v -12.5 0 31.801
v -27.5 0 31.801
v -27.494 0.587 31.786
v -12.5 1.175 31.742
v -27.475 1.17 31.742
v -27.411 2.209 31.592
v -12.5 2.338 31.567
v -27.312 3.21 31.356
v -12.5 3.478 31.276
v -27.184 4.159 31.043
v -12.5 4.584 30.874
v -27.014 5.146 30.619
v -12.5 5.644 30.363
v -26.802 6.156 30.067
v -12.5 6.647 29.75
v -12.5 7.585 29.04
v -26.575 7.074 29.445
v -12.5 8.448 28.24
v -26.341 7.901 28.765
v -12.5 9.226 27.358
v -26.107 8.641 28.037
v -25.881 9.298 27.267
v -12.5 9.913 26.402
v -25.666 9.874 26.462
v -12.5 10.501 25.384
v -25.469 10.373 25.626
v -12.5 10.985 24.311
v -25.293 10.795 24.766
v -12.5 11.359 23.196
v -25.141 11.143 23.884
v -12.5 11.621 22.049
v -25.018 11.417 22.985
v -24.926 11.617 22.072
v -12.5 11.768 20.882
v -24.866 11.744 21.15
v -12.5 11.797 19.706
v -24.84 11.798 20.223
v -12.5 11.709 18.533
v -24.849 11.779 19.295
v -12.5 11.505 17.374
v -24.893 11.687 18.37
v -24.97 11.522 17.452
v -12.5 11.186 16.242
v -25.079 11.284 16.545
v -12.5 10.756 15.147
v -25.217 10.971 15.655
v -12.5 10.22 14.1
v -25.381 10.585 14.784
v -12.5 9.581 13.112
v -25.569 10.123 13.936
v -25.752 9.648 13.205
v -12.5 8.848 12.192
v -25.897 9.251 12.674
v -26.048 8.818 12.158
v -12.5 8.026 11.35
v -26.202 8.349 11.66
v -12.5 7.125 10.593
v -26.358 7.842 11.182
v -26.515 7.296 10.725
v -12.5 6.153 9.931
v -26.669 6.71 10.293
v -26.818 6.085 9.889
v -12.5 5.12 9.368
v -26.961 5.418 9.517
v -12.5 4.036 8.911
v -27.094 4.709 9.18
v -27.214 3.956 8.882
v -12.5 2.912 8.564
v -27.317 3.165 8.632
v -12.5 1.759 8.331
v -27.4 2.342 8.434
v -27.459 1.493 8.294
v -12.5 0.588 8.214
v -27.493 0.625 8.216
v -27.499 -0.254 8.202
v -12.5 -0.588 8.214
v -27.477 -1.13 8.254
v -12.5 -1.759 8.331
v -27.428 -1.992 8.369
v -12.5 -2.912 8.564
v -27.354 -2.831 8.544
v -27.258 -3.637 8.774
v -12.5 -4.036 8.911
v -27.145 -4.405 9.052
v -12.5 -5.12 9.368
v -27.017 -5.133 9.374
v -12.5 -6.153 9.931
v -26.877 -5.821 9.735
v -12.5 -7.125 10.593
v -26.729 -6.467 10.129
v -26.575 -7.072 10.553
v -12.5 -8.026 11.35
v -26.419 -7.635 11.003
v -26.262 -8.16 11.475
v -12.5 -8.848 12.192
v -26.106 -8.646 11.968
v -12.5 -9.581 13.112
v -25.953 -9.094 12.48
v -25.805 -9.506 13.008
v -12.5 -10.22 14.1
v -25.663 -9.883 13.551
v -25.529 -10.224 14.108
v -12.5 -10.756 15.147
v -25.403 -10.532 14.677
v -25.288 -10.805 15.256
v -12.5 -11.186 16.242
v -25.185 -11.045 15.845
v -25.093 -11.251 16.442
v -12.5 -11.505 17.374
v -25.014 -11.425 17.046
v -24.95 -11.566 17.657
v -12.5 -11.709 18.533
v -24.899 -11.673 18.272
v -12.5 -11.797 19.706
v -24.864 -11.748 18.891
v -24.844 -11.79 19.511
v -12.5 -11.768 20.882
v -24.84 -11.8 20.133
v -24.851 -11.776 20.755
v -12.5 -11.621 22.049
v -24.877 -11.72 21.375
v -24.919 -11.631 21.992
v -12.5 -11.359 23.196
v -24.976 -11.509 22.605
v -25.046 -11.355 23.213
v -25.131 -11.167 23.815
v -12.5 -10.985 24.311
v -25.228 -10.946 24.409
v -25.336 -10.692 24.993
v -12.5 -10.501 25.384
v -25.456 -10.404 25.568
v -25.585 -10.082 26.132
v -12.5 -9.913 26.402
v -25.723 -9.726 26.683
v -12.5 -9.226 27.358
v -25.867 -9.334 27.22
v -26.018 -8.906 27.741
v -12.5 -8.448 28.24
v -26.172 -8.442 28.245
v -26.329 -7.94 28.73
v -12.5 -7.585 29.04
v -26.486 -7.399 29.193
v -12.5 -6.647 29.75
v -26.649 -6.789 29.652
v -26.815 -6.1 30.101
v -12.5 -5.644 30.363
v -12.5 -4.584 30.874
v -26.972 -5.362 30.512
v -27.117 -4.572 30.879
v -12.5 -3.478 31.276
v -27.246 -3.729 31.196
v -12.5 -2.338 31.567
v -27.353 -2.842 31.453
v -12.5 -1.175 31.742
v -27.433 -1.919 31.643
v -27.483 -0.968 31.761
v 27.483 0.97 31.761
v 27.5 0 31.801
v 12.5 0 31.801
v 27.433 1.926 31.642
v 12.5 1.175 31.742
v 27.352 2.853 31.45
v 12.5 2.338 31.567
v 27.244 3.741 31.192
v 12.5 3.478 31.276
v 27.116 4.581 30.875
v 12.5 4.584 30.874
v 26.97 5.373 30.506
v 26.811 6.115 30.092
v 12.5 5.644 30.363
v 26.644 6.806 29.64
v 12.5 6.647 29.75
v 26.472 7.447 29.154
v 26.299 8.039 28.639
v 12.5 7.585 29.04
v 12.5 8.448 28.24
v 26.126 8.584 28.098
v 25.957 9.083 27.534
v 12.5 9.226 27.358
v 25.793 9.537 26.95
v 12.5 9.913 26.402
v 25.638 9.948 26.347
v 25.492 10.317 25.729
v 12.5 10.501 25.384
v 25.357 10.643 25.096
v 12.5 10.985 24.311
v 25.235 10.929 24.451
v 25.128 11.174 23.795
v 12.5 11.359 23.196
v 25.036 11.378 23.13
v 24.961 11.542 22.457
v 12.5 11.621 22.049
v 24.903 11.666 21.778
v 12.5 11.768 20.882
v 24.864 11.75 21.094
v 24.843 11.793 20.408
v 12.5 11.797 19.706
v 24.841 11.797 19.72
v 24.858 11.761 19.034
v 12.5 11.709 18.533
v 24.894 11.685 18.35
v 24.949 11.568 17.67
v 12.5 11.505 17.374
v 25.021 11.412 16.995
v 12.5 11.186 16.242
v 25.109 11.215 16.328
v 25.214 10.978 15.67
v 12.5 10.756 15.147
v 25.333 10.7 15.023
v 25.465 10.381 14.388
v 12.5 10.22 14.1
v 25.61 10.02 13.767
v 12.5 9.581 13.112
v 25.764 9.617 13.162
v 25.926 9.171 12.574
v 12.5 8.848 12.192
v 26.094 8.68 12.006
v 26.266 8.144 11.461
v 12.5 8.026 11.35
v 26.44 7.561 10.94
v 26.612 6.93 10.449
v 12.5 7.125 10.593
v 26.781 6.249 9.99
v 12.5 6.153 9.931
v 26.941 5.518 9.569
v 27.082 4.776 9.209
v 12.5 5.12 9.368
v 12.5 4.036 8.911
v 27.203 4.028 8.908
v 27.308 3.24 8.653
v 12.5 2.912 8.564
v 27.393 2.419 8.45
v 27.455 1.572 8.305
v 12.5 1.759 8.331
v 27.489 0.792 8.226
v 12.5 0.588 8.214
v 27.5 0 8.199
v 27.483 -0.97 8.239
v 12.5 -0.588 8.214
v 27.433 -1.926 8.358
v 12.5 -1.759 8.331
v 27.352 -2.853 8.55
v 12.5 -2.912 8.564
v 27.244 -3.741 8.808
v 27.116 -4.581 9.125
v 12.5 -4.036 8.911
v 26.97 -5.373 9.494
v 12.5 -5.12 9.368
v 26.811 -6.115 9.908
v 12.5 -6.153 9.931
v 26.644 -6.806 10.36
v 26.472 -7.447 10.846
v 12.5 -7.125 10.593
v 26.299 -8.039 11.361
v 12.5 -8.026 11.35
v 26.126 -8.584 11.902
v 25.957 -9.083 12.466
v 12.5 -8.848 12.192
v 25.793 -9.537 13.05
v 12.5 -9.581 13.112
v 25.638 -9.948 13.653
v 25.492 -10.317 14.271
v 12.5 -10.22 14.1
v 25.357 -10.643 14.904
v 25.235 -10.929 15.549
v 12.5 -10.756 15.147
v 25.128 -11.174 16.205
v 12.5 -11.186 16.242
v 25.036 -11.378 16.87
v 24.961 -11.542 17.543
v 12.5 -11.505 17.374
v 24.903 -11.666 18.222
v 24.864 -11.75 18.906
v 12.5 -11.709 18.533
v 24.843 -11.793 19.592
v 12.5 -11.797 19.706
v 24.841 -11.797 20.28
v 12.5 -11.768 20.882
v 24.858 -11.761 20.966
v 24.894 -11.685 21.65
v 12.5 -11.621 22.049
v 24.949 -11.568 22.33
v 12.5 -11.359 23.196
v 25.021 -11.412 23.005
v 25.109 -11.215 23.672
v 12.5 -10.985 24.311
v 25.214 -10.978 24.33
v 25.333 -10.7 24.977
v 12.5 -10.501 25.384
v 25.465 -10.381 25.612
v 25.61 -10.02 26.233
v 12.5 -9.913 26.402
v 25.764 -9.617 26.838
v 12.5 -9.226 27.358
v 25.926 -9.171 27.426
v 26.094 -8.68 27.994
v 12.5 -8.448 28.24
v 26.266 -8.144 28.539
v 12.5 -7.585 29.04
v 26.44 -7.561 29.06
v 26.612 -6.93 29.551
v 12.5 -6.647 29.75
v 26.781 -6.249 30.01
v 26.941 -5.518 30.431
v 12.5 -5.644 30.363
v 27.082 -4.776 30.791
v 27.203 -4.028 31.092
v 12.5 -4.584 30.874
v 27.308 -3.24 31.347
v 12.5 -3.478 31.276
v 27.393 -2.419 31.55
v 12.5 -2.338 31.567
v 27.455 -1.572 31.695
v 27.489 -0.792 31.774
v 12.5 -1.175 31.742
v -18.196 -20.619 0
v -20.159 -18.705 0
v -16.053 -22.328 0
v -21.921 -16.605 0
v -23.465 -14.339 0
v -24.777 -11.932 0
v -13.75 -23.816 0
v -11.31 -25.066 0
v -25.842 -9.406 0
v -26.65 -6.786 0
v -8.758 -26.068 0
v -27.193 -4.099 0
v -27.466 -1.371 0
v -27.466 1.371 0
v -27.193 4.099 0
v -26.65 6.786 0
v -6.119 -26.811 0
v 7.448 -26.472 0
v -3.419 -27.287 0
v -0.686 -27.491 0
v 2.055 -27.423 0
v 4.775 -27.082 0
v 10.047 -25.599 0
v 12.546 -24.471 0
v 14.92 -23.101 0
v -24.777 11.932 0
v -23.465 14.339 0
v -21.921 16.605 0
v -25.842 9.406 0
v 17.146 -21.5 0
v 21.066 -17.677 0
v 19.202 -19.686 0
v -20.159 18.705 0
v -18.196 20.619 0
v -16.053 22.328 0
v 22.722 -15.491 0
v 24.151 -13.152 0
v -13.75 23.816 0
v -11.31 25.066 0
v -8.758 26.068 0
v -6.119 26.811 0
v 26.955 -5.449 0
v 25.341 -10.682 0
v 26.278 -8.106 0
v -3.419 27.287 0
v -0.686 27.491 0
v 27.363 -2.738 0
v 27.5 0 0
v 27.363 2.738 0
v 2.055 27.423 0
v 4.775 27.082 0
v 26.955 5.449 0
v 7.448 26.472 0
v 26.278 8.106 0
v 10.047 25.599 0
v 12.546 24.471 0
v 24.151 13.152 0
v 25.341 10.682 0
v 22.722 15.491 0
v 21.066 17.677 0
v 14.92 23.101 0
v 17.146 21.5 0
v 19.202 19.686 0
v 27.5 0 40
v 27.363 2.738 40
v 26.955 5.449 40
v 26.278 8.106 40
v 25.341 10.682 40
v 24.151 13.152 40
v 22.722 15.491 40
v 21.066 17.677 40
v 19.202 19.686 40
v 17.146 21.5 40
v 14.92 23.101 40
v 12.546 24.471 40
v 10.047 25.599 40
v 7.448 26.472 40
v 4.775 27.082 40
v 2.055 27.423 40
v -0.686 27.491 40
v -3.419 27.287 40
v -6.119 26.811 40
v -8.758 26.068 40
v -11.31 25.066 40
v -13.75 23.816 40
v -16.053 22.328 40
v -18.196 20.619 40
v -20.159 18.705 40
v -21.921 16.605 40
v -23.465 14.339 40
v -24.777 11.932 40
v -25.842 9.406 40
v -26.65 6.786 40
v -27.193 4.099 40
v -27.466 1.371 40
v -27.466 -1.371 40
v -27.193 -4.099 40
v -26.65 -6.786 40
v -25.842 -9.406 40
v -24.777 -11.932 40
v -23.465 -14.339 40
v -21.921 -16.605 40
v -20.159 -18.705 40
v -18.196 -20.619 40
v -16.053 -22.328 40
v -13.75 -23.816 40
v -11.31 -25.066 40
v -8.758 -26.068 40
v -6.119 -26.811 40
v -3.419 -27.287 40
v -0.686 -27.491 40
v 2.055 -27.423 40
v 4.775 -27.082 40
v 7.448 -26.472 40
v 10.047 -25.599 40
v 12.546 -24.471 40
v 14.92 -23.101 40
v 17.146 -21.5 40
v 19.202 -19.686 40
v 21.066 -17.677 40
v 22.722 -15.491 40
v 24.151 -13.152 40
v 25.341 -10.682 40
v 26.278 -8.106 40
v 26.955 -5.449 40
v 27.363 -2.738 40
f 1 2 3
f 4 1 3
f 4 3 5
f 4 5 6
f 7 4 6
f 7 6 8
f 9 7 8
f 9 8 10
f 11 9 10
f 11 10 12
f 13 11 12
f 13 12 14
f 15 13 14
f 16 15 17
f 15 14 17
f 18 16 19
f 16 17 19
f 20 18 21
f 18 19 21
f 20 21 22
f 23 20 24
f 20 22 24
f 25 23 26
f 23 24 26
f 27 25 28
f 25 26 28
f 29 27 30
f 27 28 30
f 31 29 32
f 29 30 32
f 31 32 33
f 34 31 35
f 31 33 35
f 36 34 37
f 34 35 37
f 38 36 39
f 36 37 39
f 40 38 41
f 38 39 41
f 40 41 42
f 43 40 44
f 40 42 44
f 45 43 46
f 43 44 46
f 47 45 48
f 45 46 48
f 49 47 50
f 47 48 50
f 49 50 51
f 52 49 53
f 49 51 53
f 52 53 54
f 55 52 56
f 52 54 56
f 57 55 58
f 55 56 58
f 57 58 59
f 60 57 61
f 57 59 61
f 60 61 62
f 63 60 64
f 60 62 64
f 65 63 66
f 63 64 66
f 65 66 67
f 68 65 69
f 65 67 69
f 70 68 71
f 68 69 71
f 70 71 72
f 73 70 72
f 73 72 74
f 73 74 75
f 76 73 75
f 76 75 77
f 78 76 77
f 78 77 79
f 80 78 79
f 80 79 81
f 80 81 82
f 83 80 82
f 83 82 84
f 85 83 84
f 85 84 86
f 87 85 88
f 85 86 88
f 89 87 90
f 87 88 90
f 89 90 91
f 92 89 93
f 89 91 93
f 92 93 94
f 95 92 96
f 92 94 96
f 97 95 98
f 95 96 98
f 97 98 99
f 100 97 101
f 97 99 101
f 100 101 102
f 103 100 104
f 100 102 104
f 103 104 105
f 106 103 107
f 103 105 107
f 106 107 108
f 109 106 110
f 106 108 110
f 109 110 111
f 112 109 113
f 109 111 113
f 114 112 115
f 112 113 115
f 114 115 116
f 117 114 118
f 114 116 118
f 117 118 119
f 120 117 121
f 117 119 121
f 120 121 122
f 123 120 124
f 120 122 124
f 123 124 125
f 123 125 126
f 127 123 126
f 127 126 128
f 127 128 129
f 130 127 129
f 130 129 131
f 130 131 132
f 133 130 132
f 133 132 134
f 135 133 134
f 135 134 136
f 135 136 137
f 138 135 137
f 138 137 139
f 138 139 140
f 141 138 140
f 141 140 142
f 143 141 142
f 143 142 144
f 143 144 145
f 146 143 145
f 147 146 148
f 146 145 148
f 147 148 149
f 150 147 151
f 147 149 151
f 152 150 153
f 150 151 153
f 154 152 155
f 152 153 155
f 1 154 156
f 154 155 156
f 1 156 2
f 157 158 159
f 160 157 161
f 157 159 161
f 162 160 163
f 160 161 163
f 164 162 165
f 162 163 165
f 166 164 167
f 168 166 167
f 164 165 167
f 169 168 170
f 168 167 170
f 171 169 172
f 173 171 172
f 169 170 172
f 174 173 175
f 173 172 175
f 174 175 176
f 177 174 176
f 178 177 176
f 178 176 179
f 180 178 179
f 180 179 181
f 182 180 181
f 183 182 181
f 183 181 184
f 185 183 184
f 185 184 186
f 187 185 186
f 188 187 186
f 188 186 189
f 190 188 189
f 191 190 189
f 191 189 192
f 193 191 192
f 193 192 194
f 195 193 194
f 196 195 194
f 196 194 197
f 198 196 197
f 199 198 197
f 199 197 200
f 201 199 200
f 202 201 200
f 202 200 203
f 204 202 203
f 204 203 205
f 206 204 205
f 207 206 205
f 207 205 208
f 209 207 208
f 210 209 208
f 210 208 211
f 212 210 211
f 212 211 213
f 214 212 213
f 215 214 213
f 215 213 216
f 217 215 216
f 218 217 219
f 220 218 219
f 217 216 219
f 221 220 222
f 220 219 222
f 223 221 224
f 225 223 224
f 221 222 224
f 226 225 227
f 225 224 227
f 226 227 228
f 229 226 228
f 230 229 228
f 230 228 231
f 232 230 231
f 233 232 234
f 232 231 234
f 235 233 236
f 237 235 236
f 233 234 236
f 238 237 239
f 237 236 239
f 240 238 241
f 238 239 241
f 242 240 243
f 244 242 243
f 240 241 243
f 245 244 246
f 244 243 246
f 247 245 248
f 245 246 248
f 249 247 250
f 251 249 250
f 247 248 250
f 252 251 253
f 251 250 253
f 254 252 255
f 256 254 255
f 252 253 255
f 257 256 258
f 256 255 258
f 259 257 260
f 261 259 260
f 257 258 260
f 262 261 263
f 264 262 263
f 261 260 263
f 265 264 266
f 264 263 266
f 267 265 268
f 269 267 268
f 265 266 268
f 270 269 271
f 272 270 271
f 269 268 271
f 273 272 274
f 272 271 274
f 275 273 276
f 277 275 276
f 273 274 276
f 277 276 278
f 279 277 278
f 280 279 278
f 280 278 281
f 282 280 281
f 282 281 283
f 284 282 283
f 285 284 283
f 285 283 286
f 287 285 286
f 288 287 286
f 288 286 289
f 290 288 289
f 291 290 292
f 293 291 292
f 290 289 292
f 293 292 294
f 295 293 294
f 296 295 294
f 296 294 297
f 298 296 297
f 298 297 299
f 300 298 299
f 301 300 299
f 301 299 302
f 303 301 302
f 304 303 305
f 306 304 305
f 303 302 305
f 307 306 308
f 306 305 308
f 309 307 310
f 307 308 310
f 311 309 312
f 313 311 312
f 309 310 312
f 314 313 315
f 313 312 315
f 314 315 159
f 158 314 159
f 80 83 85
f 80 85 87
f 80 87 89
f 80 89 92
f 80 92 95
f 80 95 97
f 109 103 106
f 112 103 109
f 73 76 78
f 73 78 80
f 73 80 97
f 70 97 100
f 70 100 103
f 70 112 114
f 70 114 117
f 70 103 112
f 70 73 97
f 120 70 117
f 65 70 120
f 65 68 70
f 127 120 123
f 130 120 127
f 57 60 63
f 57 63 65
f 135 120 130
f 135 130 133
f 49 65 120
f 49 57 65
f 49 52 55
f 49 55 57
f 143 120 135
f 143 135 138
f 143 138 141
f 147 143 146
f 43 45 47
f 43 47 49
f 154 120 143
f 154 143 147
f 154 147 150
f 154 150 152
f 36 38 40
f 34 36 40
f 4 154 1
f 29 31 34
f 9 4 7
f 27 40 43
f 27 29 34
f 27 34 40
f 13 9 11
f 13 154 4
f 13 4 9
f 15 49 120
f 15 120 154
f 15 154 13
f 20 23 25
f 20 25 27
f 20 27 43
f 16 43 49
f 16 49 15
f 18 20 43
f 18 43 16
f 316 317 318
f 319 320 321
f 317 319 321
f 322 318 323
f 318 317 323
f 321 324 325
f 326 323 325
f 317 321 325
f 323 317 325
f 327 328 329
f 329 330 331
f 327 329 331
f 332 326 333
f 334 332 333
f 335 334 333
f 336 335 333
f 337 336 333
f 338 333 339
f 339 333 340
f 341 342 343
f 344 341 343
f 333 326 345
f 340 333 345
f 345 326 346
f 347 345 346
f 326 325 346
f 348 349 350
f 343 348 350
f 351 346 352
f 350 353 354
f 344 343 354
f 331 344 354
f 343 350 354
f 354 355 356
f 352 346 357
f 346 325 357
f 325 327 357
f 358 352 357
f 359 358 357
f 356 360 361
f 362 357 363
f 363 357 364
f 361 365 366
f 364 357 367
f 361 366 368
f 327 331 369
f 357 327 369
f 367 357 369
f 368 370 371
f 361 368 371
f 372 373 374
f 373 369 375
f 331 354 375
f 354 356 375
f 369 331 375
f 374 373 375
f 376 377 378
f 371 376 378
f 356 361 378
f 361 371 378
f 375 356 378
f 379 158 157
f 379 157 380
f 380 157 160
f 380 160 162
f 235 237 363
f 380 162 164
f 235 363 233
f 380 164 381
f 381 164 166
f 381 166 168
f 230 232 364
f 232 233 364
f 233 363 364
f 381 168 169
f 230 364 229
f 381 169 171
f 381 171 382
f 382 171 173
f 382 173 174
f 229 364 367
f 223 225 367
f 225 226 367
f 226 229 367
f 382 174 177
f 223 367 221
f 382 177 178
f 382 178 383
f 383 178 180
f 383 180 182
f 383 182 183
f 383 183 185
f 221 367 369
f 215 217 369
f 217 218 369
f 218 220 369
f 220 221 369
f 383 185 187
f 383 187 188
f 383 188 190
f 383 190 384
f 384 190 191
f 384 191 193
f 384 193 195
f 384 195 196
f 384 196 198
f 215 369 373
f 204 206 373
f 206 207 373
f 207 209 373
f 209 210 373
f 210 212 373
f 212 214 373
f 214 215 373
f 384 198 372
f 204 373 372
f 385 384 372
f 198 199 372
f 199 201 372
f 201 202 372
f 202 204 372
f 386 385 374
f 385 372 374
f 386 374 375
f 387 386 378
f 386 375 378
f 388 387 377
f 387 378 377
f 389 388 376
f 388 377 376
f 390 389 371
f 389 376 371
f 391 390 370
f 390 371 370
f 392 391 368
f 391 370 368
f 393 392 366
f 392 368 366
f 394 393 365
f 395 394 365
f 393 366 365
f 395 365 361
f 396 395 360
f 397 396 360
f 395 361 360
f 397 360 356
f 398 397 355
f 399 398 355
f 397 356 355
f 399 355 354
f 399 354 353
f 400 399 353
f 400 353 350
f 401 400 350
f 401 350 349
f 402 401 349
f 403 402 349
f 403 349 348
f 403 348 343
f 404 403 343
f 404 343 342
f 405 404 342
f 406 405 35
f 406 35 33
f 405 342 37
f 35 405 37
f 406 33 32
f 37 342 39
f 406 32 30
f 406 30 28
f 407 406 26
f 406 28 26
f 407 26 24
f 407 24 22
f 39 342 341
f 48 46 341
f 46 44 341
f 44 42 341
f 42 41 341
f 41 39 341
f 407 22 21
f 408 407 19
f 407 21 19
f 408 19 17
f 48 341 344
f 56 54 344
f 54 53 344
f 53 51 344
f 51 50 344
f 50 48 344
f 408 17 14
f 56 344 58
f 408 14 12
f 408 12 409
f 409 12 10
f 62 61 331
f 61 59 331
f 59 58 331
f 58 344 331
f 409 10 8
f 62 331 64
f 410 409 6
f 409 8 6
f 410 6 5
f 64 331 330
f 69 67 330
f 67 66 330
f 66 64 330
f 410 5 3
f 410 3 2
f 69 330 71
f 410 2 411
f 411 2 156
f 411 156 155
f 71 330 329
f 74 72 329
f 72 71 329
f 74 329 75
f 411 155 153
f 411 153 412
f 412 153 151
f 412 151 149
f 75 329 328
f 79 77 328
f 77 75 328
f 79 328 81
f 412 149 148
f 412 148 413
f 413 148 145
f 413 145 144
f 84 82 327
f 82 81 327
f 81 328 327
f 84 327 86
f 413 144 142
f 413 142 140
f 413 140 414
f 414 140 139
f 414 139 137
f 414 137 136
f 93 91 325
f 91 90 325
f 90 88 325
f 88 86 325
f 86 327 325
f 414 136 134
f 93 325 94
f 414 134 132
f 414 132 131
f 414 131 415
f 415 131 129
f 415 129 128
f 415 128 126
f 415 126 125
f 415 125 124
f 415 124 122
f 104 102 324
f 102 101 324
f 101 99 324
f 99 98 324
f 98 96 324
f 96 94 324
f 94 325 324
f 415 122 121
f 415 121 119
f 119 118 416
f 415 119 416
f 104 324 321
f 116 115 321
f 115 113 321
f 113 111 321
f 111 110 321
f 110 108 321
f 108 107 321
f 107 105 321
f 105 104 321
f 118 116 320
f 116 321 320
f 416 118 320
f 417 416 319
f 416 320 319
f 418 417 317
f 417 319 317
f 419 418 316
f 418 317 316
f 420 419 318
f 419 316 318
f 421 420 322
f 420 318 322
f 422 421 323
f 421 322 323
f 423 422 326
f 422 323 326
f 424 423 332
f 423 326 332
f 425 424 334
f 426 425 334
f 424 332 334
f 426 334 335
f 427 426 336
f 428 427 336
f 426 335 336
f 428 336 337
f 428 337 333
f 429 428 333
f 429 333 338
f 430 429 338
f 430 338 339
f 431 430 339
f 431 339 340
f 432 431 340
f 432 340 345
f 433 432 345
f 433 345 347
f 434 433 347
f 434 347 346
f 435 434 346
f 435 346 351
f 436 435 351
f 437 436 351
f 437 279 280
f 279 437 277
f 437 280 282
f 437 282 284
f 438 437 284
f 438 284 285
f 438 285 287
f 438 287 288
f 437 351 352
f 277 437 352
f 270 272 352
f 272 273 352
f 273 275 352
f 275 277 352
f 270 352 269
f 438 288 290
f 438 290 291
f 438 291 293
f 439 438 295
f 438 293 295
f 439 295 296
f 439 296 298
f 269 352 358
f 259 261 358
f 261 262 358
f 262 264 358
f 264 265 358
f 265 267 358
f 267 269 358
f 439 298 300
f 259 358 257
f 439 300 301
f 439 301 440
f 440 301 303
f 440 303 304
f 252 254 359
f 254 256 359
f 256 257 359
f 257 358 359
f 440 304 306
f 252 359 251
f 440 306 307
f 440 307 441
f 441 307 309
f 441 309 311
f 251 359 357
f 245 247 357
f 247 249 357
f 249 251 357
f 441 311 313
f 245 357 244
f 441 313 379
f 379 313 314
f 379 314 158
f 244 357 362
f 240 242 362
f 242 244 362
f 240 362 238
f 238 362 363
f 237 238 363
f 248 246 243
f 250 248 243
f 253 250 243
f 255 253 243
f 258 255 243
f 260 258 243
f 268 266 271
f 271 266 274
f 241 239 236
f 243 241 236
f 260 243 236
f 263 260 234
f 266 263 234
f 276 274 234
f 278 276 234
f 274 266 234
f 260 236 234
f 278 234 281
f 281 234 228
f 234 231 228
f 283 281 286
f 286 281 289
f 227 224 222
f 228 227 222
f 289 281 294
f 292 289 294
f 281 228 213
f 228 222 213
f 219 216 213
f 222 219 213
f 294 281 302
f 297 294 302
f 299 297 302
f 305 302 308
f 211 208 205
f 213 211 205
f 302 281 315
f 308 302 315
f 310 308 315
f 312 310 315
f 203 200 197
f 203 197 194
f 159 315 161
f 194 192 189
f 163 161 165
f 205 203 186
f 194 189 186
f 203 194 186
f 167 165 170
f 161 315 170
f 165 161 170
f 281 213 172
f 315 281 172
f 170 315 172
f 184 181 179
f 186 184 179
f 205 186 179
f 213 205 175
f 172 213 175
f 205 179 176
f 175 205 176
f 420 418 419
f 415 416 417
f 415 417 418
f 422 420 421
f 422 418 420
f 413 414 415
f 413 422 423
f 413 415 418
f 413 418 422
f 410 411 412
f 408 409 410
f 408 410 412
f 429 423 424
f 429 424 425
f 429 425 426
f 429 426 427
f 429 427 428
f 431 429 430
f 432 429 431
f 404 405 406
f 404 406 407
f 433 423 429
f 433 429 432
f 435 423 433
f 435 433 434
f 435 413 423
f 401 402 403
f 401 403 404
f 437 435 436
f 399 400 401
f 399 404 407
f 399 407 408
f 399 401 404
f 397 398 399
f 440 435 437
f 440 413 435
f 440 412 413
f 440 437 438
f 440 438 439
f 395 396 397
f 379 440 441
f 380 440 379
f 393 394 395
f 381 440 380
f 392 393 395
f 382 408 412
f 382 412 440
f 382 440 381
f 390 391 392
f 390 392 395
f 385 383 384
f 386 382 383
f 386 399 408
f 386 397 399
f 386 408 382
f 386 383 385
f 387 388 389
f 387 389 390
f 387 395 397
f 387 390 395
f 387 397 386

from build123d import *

# Parameters (mm, degrees)
CROQUIS1_R              = 27.5
SALIENTE_EXTRUIR1_DEPTH = 40
CROQUIS2_R              = 11.800520357
CORTAR_EXTRUIR1_DEPTH   = 15
CORTAR_EXTRUIR4_START   = 15
CROQUIS3_R              = 11.800520357
CORTAR_EXTRUIR4_DEPTH   = 15


with BuildPart() as part:
    # Croquis1 → Saliente-Extruir1 (new body)
    with BuildSketch(Plane.XY):
        Circle(CROQUIS1_R)
    extrude(amount=SALIENTE_EXTRUIR1_DEPTH)

    # Croquis2 → Cortar-Extruir1 (cut)
    with BuildSketch(Plane.ZY.offset(27.5)):
        with Locations((20, 0)):
            Circle(CROQUIS2_R)
    extrude(amount=-CORTAR_EXTRUIR1_DEPTH, mode=Mode.SUBTRACT)

    # Croquis3 → Cortar-Extruir4 (cut)
    with BuildSketch(Plane.ZY.offset(-27.5).offset(CORTAR_EXTRUIR4_START)):
        with Locations((20, 0)):
            Circle(CROQUIS3_R)
    extrude(amount=-CORTAR_EXTRUIR4_DEPTH, mode=Mode.SUBTRACT)


solid = part.part
